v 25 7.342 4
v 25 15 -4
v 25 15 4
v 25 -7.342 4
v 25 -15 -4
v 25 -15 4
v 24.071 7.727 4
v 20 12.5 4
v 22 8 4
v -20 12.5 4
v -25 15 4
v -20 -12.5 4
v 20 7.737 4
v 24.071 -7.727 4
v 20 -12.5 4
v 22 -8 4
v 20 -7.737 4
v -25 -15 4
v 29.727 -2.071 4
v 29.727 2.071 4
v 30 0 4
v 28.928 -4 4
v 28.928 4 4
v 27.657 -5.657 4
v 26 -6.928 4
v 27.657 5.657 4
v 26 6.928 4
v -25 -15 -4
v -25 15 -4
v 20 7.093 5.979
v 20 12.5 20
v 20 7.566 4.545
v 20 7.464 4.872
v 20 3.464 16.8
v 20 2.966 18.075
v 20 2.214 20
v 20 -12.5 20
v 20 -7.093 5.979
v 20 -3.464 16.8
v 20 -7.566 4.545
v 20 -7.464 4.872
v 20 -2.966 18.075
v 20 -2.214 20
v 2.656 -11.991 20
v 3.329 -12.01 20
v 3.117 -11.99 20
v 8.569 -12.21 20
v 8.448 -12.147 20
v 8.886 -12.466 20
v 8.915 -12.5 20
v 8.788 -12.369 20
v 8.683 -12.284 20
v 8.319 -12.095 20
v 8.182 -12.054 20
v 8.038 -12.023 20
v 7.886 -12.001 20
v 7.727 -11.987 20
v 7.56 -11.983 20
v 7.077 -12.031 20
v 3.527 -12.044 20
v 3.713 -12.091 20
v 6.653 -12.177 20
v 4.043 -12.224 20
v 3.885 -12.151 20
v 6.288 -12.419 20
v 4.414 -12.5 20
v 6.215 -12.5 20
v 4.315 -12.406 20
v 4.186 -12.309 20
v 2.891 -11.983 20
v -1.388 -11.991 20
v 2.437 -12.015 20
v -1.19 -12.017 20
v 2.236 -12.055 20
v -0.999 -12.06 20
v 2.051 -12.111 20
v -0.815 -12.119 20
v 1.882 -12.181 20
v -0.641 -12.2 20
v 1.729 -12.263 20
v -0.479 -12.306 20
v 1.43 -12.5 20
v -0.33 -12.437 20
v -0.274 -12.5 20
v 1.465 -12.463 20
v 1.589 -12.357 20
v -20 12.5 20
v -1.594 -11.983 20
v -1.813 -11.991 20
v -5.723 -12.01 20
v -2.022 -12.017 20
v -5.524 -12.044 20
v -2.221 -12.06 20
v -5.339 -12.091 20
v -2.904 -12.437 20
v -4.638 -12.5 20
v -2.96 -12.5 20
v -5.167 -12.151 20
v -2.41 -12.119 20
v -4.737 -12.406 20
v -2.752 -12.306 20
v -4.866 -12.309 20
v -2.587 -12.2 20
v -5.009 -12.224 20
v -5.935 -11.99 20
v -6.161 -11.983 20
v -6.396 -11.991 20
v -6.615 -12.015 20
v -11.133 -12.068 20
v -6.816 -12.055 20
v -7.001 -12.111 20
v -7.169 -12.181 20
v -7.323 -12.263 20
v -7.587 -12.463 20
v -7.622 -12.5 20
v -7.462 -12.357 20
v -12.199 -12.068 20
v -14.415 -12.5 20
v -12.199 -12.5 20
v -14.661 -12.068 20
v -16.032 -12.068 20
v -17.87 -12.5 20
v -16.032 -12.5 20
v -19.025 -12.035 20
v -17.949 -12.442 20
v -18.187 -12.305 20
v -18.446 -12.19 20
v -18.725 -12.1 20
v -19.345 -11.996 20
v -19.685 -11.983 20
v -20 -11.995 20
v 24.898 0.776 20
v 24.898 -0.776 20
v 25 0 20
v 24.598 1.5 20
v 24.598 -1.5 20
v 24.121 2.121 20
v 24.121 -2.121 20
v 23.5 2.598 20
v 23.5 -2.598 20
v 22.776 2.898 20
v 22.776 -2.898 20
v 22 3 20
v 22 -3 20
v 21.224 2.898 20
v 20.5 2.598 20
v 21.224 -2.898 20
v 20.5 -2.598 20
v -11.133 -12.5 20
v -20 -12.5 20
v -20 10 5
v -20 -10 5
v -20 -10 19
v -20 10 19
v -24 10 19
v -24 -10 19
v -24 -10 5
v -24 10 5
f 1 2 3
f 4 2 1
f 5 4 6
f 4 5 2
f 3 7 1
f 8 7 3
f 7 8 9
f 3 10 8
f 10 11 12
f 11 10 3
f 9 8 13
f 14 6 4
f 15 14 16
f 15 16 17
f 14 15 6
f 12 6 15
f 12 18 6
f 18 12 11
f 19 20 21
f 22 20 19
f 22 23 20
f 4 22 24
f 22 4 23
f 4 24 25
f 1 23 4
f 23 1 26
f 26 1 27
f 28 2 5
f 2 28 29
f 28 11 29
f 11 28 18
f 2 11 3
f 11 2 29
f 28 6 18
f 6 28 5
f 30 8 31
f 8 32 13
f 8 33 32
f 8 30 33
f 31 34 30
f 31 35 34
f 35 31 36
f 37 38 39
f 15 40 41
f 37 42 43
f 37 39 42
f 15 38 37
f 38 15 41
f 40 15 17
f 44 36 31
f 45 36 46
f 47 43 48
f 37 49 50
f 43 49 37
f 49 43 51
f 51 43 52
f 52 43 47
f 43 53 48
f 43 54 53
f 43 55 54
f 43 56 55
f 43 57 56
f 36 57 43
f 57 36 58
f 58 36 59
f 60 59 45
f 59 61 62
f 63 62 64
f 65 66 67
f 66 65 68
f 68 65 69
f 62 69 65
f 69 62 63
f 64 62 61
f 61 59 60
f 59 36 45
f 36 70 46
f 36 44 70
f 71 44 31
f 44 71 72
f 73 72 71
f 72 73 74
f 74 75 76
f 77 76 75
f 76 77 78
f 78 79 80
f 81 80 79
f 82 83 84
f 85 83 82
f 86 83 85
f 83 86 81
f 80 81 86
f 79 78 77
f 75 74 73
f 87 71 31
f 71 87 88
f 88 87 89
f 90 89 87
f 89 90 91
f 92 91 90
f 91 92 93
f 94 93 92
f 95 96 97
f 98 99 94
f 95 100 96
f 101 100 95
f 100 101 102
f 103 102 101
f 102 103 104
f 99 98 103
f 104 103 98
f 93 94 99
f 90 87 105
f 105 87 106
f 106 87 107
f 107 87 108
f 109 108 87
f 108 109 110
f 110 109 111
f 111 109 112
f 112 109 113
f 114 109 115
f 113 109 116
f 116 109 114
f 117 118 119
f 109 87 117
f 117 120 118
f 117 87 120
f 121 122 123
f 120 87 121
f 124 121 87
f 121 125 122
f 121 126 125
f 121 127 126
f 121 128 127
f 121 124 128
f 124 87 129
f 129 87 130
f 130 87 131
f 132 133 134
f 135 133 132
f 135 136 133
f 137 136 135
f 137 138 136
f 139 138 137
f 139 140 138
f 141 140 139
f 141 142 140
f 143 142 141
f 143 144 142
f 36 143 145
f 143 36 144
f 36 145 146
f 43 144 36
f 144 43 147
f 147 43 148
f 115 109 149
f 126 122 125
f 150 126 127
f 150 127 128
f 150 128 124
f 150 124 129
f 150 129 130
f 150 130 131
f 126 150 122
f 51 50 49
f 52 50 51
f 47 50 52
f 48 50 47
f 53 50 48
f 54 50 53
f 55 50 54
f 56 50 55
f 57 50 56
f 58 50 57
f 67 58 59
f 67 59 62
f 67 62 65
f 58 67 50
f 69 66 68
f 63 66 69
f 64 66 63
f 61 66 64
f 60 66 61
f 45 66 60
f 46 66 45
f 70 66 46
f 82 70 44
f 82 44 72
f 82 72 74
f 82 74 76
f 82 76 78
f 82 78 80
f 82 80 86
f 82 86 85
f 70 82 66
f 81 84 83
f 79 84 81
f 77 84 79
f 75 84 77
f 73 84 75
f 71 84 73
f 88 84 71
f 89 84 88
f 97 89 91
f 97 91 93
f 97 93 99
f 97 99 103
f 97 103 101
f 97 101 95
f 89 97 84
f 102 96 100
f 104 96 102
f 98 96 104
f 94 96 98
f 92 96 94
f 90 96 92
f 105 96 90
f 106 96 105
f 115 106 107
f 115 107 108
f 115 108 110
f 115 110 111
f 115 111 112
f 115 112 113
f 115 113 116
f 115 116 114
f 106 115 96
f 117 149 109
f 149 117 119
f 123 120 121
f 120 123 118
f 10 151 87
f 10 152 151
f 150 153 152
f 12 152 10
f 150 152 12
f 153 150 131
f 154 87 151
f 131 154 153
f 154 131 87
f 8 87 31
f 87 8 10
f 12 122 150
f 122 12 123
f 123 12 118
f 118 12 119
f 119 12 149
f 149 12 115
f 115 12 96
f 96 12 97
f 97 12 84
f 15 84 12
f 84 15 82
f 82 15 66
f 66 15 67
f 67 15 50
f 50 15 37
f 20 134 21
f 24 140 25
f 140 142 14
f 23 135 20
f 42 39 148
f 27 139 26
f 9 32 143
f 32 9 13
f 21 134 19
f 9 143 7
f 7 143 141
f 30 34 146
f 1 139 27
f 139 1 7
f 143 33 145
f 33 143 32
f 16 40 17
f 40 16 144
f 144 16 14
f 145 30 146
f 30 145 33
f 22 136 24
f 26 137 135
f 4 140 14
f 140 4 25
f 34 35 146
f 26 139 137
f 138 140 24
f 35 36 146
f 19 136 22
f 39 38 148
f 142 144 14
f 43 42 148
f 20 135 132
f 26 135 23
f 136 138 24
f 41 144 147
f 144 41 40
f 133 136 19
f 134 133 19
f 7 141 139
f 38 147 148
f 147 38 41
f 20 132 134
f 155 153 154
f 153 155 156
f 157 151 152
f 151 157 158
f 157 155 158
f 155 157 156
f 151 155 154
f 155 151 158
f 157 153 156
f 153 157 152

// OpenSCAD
$fn = 24;

module anvil() {
    // Base
    cube([50, 30, 8], center = true);
    
    // Central body block
    translate([0, 0, 12])
        cube([40, 25, 16], center = true);
    
    // Horn (tapered cone from one side)
    translate([22, 0, 12]) {
        cylinder(h = 16, r1 = 8, r2 = 3, center = true);
    }
    
    // Heel block on opposite side
    translate([-18, 0, 12])
        cube([12, 20, 14], center = true);
}

module text_emboss() {
    // "PYCON 2026" embossed on the side
    translate([-15, -15, 20]) {
        linear_extrude(height = 1.5) {
            text("PYCON 2026", size = 6, halign = "center", valign = "center", font = "Arial:style=Bold");
        }
    }
}

module anvil_with_text() {
    difference() {
        anvil();
        text_emboss();
    }
}

anvil_with_text();
